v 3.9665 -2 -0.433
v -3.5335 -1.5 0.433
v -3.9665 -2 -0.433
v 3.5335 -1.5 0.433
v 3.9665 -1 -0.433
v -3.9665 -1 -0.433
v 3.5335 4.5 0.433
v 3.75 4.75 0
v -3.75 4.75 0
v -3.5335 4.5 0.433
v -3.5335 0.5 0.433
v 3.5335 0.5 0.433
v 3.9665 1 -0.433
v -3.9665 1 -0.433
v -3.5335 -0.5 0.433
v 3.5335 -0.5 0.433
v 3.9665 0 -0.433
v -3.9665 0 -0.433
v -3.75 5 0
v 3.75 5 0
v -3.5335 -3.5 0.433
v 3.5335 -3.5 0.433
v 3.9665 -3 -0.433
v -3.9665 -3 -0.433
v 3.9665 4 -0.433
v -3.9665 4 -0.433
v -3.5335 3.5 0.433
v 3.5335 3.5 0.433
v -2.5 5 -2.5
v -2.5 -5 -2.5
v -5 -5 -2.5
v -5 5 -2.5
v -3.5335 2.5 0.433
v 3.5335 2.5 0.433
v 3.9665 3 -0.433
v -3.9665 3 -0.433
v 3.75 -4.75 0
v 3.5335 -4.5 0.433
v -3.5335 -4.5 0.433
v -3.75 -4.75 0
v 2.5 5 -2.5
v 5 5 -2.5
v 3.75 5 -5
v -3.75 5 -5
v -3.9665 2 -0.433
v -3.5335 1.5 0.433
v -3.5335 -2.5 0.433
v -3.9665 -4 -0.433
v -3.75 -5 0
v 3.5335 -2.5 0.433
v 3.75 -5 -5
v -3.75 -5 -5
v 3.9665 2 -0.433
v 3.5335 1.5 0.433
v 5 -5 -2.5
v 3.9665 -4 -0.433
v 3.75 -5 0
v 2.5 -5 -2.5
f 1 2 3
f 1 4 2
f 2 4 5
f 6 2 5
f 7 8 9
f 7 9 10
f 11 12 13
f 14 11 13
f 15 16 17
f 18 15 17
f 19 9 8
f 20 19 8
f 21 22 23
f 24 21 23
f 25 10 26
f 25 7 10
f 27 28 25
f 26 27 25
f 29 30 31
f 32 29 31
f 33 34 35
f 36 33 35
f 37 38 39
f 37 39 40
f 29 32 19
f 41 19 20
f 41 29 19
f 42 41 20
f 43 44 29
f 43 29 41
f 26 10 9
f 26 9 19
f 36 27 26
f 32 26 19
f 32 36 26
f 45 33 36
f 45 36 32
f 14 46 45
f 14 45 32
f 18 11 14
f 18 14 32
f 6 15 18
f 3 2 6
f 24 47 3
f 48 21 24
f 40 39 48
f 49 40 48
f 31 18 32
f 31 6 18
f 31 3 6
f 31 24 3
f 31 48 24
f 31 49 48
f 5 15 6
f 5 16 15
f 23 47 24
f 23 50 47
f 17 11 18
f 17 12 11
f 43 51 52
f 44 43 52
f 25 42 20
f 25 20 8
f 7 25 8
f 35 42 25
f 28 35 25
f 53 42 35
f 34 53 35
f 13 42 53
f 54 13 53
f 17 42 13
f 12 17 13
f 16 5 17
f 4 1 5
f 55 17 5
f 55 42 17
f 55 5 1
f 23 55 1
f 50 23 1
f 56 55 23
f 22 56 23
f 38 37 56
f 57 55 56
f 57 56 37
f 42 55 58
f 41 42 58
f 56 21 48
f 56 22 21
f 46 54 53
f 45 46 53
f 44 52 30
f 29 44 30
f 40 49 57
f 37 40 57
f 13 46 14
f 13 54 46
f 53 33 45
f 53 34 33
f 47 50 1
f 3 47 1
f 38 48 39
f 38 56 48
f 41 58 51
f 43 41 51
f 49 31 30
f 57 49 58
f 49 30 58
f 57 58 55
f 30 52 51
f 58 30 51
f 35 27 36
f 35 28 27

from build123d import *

# Parameters (mm, degrees)
BOSS_EXTRUDE1_DEPTH             = 5
BOSS_EXTRUDE1_DEPTH_BACK        = 5
BOSS_EXTRUDE2_REACH             = 10.66
BOSS_EXTRUDE2_DIRECTION_2_REACH = 10.66
CUT_EXTRUDE1_DEPTH              = 9.660254038
CUT_EXTRUDE1_DEPTH_BACK         = 9.660254038


with BuildPart() as part:
    # Sketch1 → Boss-Extrude1 (new, two sides: drawn at the far end of the back side and taken through both)
    with BuildSketch(Plane(origin=(0, 0, 0), x_dir=(1, 0, 0), z_dir=(0, 1, 0)).offset(-BOSS_EXTRUDE1_DEPTH_BACK)):
        Polygon((-3.75, 0), (3.75, 0), (5, 2.5), (2.5, 2.5), (3.75, 5), (-3.75, 5), (-2.5, 2.5), (-5, 2.5), align=None)
    extrude(amount=BOSS_EXTRUDE1_DEPTH + BOSS_EXTRUDE1_DEPTH_BACK)

    # Boss-Extrude2: up to this plane
    boss_extrude2_end = Plane(origin=(3.75, -5, 0), z_dir=(0.8944271909999159, 0, 0.44721359549995815))
    # Sketch3 → Boss-Extrude2 (add, up to the surface)
    with BuildSketch(Plane(origin=(0, 0, 0), x_dir=(0, 0, -1), z_dir=(1, 0, 0)), mode=Mode.PRIVATE) as boss_extrude2_sk1:
        Polygon((-0.433012702, 4.5), (0.216506351, 4.125), (0.216506351, 4.875), align=None)
    boss_extrude2_tool1 = split(extrude(boss_extrude2_sk1.sketch, amount=BOSS_EXTRUDE2_REACH, mode=Mode.PRIVATE), bisect_by=boss_extrude2_end, keep=Keep.BOTH, mode=Mode.PRIVATE)
    add(boss_extrude2_tool1.solids().sort_by_distance((0, 4.5, 0))[0])
    # Sketch3 → Boss-Extrude2 (add, up to the surface)
    with BuildSketch(Plane(origin=(0, 0, 0), x_dir=(0, 0, -1), z_dir=(1, 0, 0)), mode=Mode.PRIVATE) as boss_extrude2_sk2:
        Polygon((0.216506351, 3.875), (-0.433012702, 3.5), (0.216506351, 3.125), align=None)
    boss_extrude2_tool2 = split(extrude(boss_extrude2_sk2.sketch, amount=BOSS_EXTRUDE2_REACH, mode=Mode.PRIVATE), bisect_by=boss_extrude2_end, keep=Keep.BOTH, mode=Mode.PRIVATE)
    add(boss_extrude2_tool2.solids().sort_by_distance((0, 3.5, 0))[0])
    # Sketch3 → Boss-Extrude2 (add, up to the surface)
    with BuildSketch(Plane(origin=(0, 0, 0), x_dir=(0, 0, -1), z_dir=(1, 0, 0)), mode=Mode.PRIVATE) as boss_extrude2_sk3:
        Polygon((0.216506351, 2.875), (-0.433012702, 2.5), (0.216506351, 2.125), align=None)
    boss_extrude2_tool3 = split(extrude(boss_extrude2_sk3.sketch, amount=BOSS_EXTRUDE2_REACH, mode=Mode.PRIVATE), bisect_by=boss_extrude2_end, keep=Keep.BOTH, mode=Mode.PRIVATE)
    add(boss_extrude2_tool3.solids().sort_by_distance((0, 2.5, 0))[0])
    # Sketch3 → Boss-Extrude2 (add, up to the surface)
    with BuildSketch(Plane(origin=(0, 0, 0), x_dir=(0, 0, -1), z_dir=(1, 0, 0)), mode=Mode.PRIVATE) as boss_extrude2_sk4:
        Polygon((0.216506351, 1.875), (-0.433012702, 1.5), (0.216506351, 1.125), align=None)
    boss_extrude2_tool4 = split(extrude(boss_extrude2_sk4.sketch, amount=BOSS_EXTRUDE2_REACH, mode=Mode.PRIVATE), bisect_by=boss_extrude2_end, keep=Keep.BOTH, mode=Mode.PRIVATE)
    add(boss_extrude2_tool4.solids().sort_by_distance((0, 1.5, 0))[0])
    # Sketch3 → Boss-Extrude2 (add, up to the surface)
    with BuildSketch(Plane(origin=(0, 0, 0), x_dir=(0, 0, -1), z_dir=(1, 0, 0)), mode=Mode.PRIVATE) as boss_extrude2_sk5:
        Polygon((0.216506351, 0.875), (-0.433012702, 0.5), (0.216506351, 0.125), align=None)
    boss_extrude2_tool5 = split(extrude(boss_extrude2_sk5.sketch, amount=BOSS_EXTRUDE2_REACH, mode=Mode.PRIVATE), bisect_by=boss_extrude2_end, keep=Keep.BOTH, mode=Mode.PRIVATE)
    add(boss_extrude2_tool5.solids().sort_by_distance((0, 0.5, 0))[0])
    # Sketch3 → Boss-Extrude2 (add, up to the surface)
    with BuildSketch(Plane(origin=(0, 0, 0), x_dir=(0, 0, -1), z_dir=(1, 0, 0)), mode=Mode.PRIVATE) as boss_extrude2_sk6:
        Polygon((0.216506351, -0.125), (-0.433012702, -0.5), (0.216506351, -0.875), align=None)
    boss_extrude2_tool6 = split(extrude(boss_extrude2_sk6.sketch, amount=BOSS_EXTRUDE2_REACH, mode=Mode.PRIVATE), bisect_by=boss_extrude2_end, keep=Keep.BOTH, mode=Mode.PRIVATE)
    add(boss_extrude2_tool6.solids().sort_by_distance((0, -0.5, 0))[0])
    # Sketch3 → Boss-Extrude2 (add, up to the surface)
    with BuildSketch(Plane(origin=(0, 0, 0), x_dir=(0, 0, -1), z_dir=(1, 0, 0)), mode=Mode.PRIVATE) as boss_extrude2_sk7:
        Polygon((0.216506351, -1.125), (-0.433012702, -1.5), (0.216506351, -1.875), align=None)
    boss_extrude2_tool7 = split(extrude(boss_extrude2_sk7.sketch, amount=BOSS_EXTRUDE2_REACH, mode=Mode.PRIVATE), bisect_by=boss_extrude2_end, keep=Keep.BOTH, mode=Mode.PRIVATE)
    add(boss_extrude2_tool7.solids().sort_by_distance((0, -1.5, 0))[0])
    # Sketch3 → Boss-Extrude2 (add, up to the surface)
    with BuildSketch(Plane(origin=(0, 0, 0), x_dir=(0, 0, -1), z_dir=(1, 0, 0)), mode=Mode.PRIVATE) as boss_extrude2_sk8:
        Polygon((0.216506351, -2.125), (-0.433012702, -2.5), (0.216506351, -2.875), align=None)
    boss_extrude2_tool8 = split(extrude(boss_extrude2_sk8.sketch, amount=BOSS_EXTRUDE2_REACH, mode=Mode.PRIVATE), bisect_by=boss_extrude2_end, keep=Keep.BOTH, mode=Mode.PRIVATE)
    add(boss_extrude2_tool8.solids().sort_by_distance((0, -2.5, 0))[0])
    # Sketch3 → Boss-Extrude2 (add, up to the surface)
    with BuildSketch(Plane(origin=(0, 0, 0), x_dir=(0, 0, -1), z_dir=(1, 0, 0)), mode=Mode.PRIVATE) as boss_extrude2_sk9:
        Polygon((0.216506351, -3.125), (-0.433012702, -3.5), (0.216506351, -3.875), align=None)
    boss_extrude2_tool9 = split(extrude(boss_extrude2_sk9.sketch, amount=BOSS_EXTRUDE2_REACH, mode=Mode.PRIVATE), bisect_by=boss_extrude2_end, keep=Keep.BOTH, mode=Mode.PRIVATE)
    add(boss_extrude2_tool9.solids().sort_by_distance((0, -3.5, 0))[0])
    # Sketch3 → Boss-Extrude2 (add, up to the surface)
    with BuildSketch(Plane(origin=(0, 0, 0), x_dir=(0, 0, -1), z_dir=(1, 0, 0)), mode=Mode.PRIVATE) as boss_extrude2_sk10:
        Polygon((0.216506351, -4.125), (-0.433012702, -4.5), (0.216506351, -4.875), align=None)
    boss_extrude2_tool10 = split(extrude(boss_extrude2_sk10.sketch, amount=BOSS_EXTRUDE2_REACH, mode=Mode.PRIVATE), bisect_by=boss_extrude2_end, keep=Keep.BOTH, mode=Mode.PRIVATE)
    add(boss_extrude2_tool10.solids().sort_by_distance((0, -4.5, 0))[0])

    # Boss-Extrude2 direction 2: up to this plane
    boss_extrude2_direction_2_end = Plane(origin=(-5, -5, -2.5), z_dir=(-0.8944271909999154, 0, 0.44721359549995904))
    # Sketch3 → Boss-Extrude2 direction 2 (add, up to the surface)
    with BuildSketch(Plane(origin=(0, 0, 0), x_dir=(0, 0, -1), z_dir=(1, 0, 0)), mode=Mode.PRIVATE) as boss_extrude2_direction_2_sk1:
        Polygon((-0.433012702, 4.5), (0.216506351, 4.125), (0.216506351, 4.875), align=None)
    boss_extrude2_direction_2_tool1 = split(extrude(boss_extrude2_direction_2_sk1.sketch, amount=-BOSS_EXTRUDE2_DIRECTION_2_REACH, mode=Mode.PRIVATE), bisect_by=boss_extrude2_direction_2_end, keep=Keep.BOTH, mode=Mode.PRIVATE)
    add(boss_extrude2_direction_2_tool1.solids().sort_by_distance((0, 4.5, 0))[0])
    # Sketch3 → Boss-Extrude2 direction 2 (add, up to the surface)
    with BuildSketch(Plane(origin=(0, 0, 0), x_dir=(0, 0, -1), z_dir=(1, 0, 0)), mode=Mode.PRIVATE) as boss_extrude2_direction_2_sk2:
        Polygon((0.216506351, 3.875), (-0.433012702, 3.5), (0.216506351, 3.125), align=None)
    boss_extrude2_direction_2_tool2 = split(extrude(boss_extrude2_direction_2_sk2.sketch, amount=-BOSS_EXTRUDE2_DIRECTION_2_REACH, mode=Mode.PRIVATE), bisect_by=boss_extrude2_direction_2_end, keep=Keep.BOTH, mode=Mode.PRIVATE)
    add(boss_extrude2_direction_2_tool2.solids().sort_by_distance((0, 3.5, 0))[0])
    # Sketch3 → Boss-Extrude2 direction 2 (add, up to the surface)
    with BuildSketch(Plane(origin=(0, 0, 0), x_dir=(0, 0, -1), z_dir=(1, 0, 0)), mode=Mode.PRIVATE) as boss_extrude2_direction_2_sk3:
        Polygon((0.216506351, 2.875), (-0.433012702, 2.5), (0.216506351, 2.125), align=None)
    boss_extrude2_direction_2_tool3 = split(extrude(boss_extrude2_direction_2_sk3.sketch, amount=-BOSS_EXTRUDE2_DIRECTION_2_REACH, mode=Mode.PRIVATE), bisect_by=boss_extrude2_direction_2_end, keep=Keep.BOTH, mode=Mode.PRIVATE)
    add(boss_extrude2_direction_2_tool3.solids().sort_by_distance((0, 2.5, 0))[0])
    # Sketch3 → Boss-Extrude2 direction 2 (add, up to the surface)
    with BuildSketch(Plane(origin=(0, 0, 0), x_dir=(0, 0, -1), z_dir=(1, 0, 0)), mode=Mode.PRIVATE) as boss_extrude2_direction_2_sk4:
        Polygon((0.216506351, 1.875), (-0.433012702, 1.5), (0.216506351, 1.125), align=None)
    boss_extrude2_direction_2_tool4 = split(extrude(boss_extrude2_direction_2_sk4.sketch, amount=-BOSS_EXTRUDE2_DIRECTION_2_REACH, mode=Mode.PRIVATE), bisect_by=boss_extrude2_direction_2_end, keep=Keep.BOTH, mode=Mode.PRIVATE)
    add(boss_extrude2_direction_2_tool4.solids().sort_by_distance((0, 1.5, 0))[0])
    # Sketch3 → Boss-Extrude2 direction 2 (add, up to the surface)
    with BuildSketch(Plane(origin=(0, 0, 0), x_dir=(0, 0, -1), z_dir=(1, 0, 0)), mode=Mode.PRIVATE) as boss_extrude2_direction_2_sk5:
        Polygon((0.216506351, 0.875), (-0.433012702, 0.5), (0.216506351, 0.125), align=None)
    boss_extrude2_direction_2_tool5 = split(extrude(boss_extrude2_direction_2_sk5.sketch, amount=-BOSS_EXTRUDE2_DIRECTION_2_REACH, mode=Mode.PRIVATE), bisect_by=boss_extrude2_direction_2_end, keep=Keep.BOTH, mode=Mode.PRIVATE)
    add(boss_extrude2_direction_2_tool5.solids().sort_by_distance((0, 0.5, 0))[0])
    # Sketch3 → Boss-Extrude2 direction 2 (add, up to the surface)
    with BuildSketch(Plane(origin=(0, 0, 0), x_dir=(0, 0, -1), z_dir=(1, 0, 0)), mode=Mode.PRIVATE) as boss_extrude2_direction_2_sk6:
        Polygon((0.216506351, -0.125), (-0.433012702, -0.5), (0.216506351, -0.875), align=None)
    boss_extrude2_direction_2_tool6 = split(extrude(boss_extrude2_direction_2_sk6.sketch, amount=-BOSS_EXTRUDE2_DIRECTION_2_REACH, mode=Mode.PRIVATE), bisect_by=boss_extrude2_direction_2_end, keep=Keep.BOTH, mode=Mode.PRIVATE)
    add(boss_extrude2_direction_2_tool6.solids().sort_by_distance((0, -0.5, 0))[0])
    # Sketch3 → Boss-Extrude2 direction 2 (add, up to the surface)
    with BuildSketch(Plane(origin=(0, 0, 0), x_dir=(0, 0, -1), z_dir=(1, 0, 0)), mode=Mode.PRIVATE) as boss_extrude2_direction_2_sk7:
        Polygon((0.216506351, -1.125), (-0.433012702, -1.5), (0.216506351, -1.875), align=None)
    boss_extrude2_direction_2_tool7 = split(extrude(boss_extrude2_direction_2_sk7.sketch, amount=-BOSS_EXTRUDE2_DIRECTION_2_REACH, mode=Mode.PRIVATE), bisect_by=boss_extrude2_direction_2_end, keep=Keep.BOTH, mode=Mode.PRIVATE)
    add(boss_extrude2_direction_2_tool7.solids().sort_by_distance((0, -1.5, 0))[0])
    # Sketch3 → Boss-Extrude2 direction 2 (add, up to the surface)
    with BuildSketch(Plane(origin=(0, 0, 0), x_dir=(0, 0, -1), z_dir=(1, 0, 0)), mode=Mode.PRIVATE) as boss_extrude2_direction_2_sk8:
        Polygon((0.216506351, -2.125), (-0.433012702, -2.5), (0.216506351, -2.875), align=None)
    boss_extrude2_direction_2_tool8 = split(extrude(boss_extrude2_direction_2_sk8.sketch, amount=-BOSS_EXTRUDE2_DIRECTION_2_REACH, mode=Mode.PRIVATE), bisect_by=boss_extrude2_direction_2_end, keep=Keep.BOTH, mode=Mode.PRIVATE)
    add(boss_extrude2_direction_2_tool8.solids().sort_by_distance((0, -2.5, 0))[0])
    # Sketch3 → Boss-Extrude2 direction 2 (add, up to the surface)
    with BuildSketch(Plane(origin=(0, 0, 0), x_dir=(0, 0, -1), z_dir=(1, 0, 0)), mode=Mode.PRIVATE) as boss_extrude2_direction_2_sk9:
        Polygon((0.216506351, -3.125), (-0.433012702, -3.5), (0.216506351, -3.875), align=None)
    boss_extrude2_direction_2_tool9 = split(extrude(boss_extrude2_direction_2_sk9.sketch, amount=-BOSS_EXTRUDE2_DIRECTION_2_REACH, mode=Mode.PRIVATE), bisect_by=boss_extrude2_direction_2_end, keep=Keep.BOTH, mode=Mode.PRIVATE)
    add(boss_extrude2_direction_2_tool9.solids().sort_by_distance((0, -3.5, 0))[0])
    # Sketch3 → Boss-Extrude2 direction 2 (add, up to the surface)
    with BuildSketch(Plane(origin=(0, 0, 0), x_dir=(0, 0, -1), z_dir=(1, 0, 0)), mode=Mode.PRIVATE) as boss_extrude2_direction_2_sk10:
        Polygon((0.216506351, -4.125), (-0.433012702, -4.5), (0.216506351, -4.875), align=None)
    boss_extrude2_direction_2_tool10 = split(extrude(boss_extrude2_direction_2_sk10.sketch, amount=-BOSS_EXTRUDE2_DIRECTION_2_REACH, mode=Mode.PRIVATE), bisect_by=boss_extrude2_direction_2_end, keep=Keep.BOTH, mode=Mode.PRIVATE)
    add(boss_extrude2_direction_2_tool10.solids().sort_by_distance((0, -4.5, 0))[0])

    # Sketch4 → Cut-Extrude1 (cut, two sides: drawn at the far end of the back side and taken through both)
    with BuildSketch(Plane(origin=(0, 0, 0), x_dir=(0, 0, -1), z_dir=(1, 0, 0)).offset(-CUT_EXTRUDE1_DEPTH_BACK)):
        Polygon((0.433012702, 4), (-0.216506351, 4.375), (-0.216506351, 3.625), align=None)
        Polygon((-0.216506351, 2.625), (0.433012702, 3), (-0.216506351, 3.375), align=None)
        Polygon((-0.216506351, 1.625), (0.433012702, 2), (-0.216506351, 2.375), align=None)
        Polygon((-0.216506351, 0.625), (0.433012702, 1), (-0.216506351, 1.375), align=None)
        Polygon((-0.216506351, -0.375), (0.433012702, 0), (-0.216506351, 0.375), align=None)
        Polygon((-0.216506351, -1.375), (0.433012702, -1), (-0.216506351, -0.625), align=None)
        Polygon((-0.216506351, -2.375), (0.433012702, -2), (-0.216506351, -1.625), align=None)
        Polygon((-0.216506351, -3.375), (0.433012702, -3), (-0.216506351, -2.625), align=None)
        Polygon((-0.216506351, -4.375), (0.433012702, -4), (-0.216506351, -3.625), align=None)
    extrude(amount=CUT_EXTRUDE1_DEPTH + CUT_EXTRUDE1_DEPTH_BACK, mode=Mode.SUBTRACT)


solid = part.part
